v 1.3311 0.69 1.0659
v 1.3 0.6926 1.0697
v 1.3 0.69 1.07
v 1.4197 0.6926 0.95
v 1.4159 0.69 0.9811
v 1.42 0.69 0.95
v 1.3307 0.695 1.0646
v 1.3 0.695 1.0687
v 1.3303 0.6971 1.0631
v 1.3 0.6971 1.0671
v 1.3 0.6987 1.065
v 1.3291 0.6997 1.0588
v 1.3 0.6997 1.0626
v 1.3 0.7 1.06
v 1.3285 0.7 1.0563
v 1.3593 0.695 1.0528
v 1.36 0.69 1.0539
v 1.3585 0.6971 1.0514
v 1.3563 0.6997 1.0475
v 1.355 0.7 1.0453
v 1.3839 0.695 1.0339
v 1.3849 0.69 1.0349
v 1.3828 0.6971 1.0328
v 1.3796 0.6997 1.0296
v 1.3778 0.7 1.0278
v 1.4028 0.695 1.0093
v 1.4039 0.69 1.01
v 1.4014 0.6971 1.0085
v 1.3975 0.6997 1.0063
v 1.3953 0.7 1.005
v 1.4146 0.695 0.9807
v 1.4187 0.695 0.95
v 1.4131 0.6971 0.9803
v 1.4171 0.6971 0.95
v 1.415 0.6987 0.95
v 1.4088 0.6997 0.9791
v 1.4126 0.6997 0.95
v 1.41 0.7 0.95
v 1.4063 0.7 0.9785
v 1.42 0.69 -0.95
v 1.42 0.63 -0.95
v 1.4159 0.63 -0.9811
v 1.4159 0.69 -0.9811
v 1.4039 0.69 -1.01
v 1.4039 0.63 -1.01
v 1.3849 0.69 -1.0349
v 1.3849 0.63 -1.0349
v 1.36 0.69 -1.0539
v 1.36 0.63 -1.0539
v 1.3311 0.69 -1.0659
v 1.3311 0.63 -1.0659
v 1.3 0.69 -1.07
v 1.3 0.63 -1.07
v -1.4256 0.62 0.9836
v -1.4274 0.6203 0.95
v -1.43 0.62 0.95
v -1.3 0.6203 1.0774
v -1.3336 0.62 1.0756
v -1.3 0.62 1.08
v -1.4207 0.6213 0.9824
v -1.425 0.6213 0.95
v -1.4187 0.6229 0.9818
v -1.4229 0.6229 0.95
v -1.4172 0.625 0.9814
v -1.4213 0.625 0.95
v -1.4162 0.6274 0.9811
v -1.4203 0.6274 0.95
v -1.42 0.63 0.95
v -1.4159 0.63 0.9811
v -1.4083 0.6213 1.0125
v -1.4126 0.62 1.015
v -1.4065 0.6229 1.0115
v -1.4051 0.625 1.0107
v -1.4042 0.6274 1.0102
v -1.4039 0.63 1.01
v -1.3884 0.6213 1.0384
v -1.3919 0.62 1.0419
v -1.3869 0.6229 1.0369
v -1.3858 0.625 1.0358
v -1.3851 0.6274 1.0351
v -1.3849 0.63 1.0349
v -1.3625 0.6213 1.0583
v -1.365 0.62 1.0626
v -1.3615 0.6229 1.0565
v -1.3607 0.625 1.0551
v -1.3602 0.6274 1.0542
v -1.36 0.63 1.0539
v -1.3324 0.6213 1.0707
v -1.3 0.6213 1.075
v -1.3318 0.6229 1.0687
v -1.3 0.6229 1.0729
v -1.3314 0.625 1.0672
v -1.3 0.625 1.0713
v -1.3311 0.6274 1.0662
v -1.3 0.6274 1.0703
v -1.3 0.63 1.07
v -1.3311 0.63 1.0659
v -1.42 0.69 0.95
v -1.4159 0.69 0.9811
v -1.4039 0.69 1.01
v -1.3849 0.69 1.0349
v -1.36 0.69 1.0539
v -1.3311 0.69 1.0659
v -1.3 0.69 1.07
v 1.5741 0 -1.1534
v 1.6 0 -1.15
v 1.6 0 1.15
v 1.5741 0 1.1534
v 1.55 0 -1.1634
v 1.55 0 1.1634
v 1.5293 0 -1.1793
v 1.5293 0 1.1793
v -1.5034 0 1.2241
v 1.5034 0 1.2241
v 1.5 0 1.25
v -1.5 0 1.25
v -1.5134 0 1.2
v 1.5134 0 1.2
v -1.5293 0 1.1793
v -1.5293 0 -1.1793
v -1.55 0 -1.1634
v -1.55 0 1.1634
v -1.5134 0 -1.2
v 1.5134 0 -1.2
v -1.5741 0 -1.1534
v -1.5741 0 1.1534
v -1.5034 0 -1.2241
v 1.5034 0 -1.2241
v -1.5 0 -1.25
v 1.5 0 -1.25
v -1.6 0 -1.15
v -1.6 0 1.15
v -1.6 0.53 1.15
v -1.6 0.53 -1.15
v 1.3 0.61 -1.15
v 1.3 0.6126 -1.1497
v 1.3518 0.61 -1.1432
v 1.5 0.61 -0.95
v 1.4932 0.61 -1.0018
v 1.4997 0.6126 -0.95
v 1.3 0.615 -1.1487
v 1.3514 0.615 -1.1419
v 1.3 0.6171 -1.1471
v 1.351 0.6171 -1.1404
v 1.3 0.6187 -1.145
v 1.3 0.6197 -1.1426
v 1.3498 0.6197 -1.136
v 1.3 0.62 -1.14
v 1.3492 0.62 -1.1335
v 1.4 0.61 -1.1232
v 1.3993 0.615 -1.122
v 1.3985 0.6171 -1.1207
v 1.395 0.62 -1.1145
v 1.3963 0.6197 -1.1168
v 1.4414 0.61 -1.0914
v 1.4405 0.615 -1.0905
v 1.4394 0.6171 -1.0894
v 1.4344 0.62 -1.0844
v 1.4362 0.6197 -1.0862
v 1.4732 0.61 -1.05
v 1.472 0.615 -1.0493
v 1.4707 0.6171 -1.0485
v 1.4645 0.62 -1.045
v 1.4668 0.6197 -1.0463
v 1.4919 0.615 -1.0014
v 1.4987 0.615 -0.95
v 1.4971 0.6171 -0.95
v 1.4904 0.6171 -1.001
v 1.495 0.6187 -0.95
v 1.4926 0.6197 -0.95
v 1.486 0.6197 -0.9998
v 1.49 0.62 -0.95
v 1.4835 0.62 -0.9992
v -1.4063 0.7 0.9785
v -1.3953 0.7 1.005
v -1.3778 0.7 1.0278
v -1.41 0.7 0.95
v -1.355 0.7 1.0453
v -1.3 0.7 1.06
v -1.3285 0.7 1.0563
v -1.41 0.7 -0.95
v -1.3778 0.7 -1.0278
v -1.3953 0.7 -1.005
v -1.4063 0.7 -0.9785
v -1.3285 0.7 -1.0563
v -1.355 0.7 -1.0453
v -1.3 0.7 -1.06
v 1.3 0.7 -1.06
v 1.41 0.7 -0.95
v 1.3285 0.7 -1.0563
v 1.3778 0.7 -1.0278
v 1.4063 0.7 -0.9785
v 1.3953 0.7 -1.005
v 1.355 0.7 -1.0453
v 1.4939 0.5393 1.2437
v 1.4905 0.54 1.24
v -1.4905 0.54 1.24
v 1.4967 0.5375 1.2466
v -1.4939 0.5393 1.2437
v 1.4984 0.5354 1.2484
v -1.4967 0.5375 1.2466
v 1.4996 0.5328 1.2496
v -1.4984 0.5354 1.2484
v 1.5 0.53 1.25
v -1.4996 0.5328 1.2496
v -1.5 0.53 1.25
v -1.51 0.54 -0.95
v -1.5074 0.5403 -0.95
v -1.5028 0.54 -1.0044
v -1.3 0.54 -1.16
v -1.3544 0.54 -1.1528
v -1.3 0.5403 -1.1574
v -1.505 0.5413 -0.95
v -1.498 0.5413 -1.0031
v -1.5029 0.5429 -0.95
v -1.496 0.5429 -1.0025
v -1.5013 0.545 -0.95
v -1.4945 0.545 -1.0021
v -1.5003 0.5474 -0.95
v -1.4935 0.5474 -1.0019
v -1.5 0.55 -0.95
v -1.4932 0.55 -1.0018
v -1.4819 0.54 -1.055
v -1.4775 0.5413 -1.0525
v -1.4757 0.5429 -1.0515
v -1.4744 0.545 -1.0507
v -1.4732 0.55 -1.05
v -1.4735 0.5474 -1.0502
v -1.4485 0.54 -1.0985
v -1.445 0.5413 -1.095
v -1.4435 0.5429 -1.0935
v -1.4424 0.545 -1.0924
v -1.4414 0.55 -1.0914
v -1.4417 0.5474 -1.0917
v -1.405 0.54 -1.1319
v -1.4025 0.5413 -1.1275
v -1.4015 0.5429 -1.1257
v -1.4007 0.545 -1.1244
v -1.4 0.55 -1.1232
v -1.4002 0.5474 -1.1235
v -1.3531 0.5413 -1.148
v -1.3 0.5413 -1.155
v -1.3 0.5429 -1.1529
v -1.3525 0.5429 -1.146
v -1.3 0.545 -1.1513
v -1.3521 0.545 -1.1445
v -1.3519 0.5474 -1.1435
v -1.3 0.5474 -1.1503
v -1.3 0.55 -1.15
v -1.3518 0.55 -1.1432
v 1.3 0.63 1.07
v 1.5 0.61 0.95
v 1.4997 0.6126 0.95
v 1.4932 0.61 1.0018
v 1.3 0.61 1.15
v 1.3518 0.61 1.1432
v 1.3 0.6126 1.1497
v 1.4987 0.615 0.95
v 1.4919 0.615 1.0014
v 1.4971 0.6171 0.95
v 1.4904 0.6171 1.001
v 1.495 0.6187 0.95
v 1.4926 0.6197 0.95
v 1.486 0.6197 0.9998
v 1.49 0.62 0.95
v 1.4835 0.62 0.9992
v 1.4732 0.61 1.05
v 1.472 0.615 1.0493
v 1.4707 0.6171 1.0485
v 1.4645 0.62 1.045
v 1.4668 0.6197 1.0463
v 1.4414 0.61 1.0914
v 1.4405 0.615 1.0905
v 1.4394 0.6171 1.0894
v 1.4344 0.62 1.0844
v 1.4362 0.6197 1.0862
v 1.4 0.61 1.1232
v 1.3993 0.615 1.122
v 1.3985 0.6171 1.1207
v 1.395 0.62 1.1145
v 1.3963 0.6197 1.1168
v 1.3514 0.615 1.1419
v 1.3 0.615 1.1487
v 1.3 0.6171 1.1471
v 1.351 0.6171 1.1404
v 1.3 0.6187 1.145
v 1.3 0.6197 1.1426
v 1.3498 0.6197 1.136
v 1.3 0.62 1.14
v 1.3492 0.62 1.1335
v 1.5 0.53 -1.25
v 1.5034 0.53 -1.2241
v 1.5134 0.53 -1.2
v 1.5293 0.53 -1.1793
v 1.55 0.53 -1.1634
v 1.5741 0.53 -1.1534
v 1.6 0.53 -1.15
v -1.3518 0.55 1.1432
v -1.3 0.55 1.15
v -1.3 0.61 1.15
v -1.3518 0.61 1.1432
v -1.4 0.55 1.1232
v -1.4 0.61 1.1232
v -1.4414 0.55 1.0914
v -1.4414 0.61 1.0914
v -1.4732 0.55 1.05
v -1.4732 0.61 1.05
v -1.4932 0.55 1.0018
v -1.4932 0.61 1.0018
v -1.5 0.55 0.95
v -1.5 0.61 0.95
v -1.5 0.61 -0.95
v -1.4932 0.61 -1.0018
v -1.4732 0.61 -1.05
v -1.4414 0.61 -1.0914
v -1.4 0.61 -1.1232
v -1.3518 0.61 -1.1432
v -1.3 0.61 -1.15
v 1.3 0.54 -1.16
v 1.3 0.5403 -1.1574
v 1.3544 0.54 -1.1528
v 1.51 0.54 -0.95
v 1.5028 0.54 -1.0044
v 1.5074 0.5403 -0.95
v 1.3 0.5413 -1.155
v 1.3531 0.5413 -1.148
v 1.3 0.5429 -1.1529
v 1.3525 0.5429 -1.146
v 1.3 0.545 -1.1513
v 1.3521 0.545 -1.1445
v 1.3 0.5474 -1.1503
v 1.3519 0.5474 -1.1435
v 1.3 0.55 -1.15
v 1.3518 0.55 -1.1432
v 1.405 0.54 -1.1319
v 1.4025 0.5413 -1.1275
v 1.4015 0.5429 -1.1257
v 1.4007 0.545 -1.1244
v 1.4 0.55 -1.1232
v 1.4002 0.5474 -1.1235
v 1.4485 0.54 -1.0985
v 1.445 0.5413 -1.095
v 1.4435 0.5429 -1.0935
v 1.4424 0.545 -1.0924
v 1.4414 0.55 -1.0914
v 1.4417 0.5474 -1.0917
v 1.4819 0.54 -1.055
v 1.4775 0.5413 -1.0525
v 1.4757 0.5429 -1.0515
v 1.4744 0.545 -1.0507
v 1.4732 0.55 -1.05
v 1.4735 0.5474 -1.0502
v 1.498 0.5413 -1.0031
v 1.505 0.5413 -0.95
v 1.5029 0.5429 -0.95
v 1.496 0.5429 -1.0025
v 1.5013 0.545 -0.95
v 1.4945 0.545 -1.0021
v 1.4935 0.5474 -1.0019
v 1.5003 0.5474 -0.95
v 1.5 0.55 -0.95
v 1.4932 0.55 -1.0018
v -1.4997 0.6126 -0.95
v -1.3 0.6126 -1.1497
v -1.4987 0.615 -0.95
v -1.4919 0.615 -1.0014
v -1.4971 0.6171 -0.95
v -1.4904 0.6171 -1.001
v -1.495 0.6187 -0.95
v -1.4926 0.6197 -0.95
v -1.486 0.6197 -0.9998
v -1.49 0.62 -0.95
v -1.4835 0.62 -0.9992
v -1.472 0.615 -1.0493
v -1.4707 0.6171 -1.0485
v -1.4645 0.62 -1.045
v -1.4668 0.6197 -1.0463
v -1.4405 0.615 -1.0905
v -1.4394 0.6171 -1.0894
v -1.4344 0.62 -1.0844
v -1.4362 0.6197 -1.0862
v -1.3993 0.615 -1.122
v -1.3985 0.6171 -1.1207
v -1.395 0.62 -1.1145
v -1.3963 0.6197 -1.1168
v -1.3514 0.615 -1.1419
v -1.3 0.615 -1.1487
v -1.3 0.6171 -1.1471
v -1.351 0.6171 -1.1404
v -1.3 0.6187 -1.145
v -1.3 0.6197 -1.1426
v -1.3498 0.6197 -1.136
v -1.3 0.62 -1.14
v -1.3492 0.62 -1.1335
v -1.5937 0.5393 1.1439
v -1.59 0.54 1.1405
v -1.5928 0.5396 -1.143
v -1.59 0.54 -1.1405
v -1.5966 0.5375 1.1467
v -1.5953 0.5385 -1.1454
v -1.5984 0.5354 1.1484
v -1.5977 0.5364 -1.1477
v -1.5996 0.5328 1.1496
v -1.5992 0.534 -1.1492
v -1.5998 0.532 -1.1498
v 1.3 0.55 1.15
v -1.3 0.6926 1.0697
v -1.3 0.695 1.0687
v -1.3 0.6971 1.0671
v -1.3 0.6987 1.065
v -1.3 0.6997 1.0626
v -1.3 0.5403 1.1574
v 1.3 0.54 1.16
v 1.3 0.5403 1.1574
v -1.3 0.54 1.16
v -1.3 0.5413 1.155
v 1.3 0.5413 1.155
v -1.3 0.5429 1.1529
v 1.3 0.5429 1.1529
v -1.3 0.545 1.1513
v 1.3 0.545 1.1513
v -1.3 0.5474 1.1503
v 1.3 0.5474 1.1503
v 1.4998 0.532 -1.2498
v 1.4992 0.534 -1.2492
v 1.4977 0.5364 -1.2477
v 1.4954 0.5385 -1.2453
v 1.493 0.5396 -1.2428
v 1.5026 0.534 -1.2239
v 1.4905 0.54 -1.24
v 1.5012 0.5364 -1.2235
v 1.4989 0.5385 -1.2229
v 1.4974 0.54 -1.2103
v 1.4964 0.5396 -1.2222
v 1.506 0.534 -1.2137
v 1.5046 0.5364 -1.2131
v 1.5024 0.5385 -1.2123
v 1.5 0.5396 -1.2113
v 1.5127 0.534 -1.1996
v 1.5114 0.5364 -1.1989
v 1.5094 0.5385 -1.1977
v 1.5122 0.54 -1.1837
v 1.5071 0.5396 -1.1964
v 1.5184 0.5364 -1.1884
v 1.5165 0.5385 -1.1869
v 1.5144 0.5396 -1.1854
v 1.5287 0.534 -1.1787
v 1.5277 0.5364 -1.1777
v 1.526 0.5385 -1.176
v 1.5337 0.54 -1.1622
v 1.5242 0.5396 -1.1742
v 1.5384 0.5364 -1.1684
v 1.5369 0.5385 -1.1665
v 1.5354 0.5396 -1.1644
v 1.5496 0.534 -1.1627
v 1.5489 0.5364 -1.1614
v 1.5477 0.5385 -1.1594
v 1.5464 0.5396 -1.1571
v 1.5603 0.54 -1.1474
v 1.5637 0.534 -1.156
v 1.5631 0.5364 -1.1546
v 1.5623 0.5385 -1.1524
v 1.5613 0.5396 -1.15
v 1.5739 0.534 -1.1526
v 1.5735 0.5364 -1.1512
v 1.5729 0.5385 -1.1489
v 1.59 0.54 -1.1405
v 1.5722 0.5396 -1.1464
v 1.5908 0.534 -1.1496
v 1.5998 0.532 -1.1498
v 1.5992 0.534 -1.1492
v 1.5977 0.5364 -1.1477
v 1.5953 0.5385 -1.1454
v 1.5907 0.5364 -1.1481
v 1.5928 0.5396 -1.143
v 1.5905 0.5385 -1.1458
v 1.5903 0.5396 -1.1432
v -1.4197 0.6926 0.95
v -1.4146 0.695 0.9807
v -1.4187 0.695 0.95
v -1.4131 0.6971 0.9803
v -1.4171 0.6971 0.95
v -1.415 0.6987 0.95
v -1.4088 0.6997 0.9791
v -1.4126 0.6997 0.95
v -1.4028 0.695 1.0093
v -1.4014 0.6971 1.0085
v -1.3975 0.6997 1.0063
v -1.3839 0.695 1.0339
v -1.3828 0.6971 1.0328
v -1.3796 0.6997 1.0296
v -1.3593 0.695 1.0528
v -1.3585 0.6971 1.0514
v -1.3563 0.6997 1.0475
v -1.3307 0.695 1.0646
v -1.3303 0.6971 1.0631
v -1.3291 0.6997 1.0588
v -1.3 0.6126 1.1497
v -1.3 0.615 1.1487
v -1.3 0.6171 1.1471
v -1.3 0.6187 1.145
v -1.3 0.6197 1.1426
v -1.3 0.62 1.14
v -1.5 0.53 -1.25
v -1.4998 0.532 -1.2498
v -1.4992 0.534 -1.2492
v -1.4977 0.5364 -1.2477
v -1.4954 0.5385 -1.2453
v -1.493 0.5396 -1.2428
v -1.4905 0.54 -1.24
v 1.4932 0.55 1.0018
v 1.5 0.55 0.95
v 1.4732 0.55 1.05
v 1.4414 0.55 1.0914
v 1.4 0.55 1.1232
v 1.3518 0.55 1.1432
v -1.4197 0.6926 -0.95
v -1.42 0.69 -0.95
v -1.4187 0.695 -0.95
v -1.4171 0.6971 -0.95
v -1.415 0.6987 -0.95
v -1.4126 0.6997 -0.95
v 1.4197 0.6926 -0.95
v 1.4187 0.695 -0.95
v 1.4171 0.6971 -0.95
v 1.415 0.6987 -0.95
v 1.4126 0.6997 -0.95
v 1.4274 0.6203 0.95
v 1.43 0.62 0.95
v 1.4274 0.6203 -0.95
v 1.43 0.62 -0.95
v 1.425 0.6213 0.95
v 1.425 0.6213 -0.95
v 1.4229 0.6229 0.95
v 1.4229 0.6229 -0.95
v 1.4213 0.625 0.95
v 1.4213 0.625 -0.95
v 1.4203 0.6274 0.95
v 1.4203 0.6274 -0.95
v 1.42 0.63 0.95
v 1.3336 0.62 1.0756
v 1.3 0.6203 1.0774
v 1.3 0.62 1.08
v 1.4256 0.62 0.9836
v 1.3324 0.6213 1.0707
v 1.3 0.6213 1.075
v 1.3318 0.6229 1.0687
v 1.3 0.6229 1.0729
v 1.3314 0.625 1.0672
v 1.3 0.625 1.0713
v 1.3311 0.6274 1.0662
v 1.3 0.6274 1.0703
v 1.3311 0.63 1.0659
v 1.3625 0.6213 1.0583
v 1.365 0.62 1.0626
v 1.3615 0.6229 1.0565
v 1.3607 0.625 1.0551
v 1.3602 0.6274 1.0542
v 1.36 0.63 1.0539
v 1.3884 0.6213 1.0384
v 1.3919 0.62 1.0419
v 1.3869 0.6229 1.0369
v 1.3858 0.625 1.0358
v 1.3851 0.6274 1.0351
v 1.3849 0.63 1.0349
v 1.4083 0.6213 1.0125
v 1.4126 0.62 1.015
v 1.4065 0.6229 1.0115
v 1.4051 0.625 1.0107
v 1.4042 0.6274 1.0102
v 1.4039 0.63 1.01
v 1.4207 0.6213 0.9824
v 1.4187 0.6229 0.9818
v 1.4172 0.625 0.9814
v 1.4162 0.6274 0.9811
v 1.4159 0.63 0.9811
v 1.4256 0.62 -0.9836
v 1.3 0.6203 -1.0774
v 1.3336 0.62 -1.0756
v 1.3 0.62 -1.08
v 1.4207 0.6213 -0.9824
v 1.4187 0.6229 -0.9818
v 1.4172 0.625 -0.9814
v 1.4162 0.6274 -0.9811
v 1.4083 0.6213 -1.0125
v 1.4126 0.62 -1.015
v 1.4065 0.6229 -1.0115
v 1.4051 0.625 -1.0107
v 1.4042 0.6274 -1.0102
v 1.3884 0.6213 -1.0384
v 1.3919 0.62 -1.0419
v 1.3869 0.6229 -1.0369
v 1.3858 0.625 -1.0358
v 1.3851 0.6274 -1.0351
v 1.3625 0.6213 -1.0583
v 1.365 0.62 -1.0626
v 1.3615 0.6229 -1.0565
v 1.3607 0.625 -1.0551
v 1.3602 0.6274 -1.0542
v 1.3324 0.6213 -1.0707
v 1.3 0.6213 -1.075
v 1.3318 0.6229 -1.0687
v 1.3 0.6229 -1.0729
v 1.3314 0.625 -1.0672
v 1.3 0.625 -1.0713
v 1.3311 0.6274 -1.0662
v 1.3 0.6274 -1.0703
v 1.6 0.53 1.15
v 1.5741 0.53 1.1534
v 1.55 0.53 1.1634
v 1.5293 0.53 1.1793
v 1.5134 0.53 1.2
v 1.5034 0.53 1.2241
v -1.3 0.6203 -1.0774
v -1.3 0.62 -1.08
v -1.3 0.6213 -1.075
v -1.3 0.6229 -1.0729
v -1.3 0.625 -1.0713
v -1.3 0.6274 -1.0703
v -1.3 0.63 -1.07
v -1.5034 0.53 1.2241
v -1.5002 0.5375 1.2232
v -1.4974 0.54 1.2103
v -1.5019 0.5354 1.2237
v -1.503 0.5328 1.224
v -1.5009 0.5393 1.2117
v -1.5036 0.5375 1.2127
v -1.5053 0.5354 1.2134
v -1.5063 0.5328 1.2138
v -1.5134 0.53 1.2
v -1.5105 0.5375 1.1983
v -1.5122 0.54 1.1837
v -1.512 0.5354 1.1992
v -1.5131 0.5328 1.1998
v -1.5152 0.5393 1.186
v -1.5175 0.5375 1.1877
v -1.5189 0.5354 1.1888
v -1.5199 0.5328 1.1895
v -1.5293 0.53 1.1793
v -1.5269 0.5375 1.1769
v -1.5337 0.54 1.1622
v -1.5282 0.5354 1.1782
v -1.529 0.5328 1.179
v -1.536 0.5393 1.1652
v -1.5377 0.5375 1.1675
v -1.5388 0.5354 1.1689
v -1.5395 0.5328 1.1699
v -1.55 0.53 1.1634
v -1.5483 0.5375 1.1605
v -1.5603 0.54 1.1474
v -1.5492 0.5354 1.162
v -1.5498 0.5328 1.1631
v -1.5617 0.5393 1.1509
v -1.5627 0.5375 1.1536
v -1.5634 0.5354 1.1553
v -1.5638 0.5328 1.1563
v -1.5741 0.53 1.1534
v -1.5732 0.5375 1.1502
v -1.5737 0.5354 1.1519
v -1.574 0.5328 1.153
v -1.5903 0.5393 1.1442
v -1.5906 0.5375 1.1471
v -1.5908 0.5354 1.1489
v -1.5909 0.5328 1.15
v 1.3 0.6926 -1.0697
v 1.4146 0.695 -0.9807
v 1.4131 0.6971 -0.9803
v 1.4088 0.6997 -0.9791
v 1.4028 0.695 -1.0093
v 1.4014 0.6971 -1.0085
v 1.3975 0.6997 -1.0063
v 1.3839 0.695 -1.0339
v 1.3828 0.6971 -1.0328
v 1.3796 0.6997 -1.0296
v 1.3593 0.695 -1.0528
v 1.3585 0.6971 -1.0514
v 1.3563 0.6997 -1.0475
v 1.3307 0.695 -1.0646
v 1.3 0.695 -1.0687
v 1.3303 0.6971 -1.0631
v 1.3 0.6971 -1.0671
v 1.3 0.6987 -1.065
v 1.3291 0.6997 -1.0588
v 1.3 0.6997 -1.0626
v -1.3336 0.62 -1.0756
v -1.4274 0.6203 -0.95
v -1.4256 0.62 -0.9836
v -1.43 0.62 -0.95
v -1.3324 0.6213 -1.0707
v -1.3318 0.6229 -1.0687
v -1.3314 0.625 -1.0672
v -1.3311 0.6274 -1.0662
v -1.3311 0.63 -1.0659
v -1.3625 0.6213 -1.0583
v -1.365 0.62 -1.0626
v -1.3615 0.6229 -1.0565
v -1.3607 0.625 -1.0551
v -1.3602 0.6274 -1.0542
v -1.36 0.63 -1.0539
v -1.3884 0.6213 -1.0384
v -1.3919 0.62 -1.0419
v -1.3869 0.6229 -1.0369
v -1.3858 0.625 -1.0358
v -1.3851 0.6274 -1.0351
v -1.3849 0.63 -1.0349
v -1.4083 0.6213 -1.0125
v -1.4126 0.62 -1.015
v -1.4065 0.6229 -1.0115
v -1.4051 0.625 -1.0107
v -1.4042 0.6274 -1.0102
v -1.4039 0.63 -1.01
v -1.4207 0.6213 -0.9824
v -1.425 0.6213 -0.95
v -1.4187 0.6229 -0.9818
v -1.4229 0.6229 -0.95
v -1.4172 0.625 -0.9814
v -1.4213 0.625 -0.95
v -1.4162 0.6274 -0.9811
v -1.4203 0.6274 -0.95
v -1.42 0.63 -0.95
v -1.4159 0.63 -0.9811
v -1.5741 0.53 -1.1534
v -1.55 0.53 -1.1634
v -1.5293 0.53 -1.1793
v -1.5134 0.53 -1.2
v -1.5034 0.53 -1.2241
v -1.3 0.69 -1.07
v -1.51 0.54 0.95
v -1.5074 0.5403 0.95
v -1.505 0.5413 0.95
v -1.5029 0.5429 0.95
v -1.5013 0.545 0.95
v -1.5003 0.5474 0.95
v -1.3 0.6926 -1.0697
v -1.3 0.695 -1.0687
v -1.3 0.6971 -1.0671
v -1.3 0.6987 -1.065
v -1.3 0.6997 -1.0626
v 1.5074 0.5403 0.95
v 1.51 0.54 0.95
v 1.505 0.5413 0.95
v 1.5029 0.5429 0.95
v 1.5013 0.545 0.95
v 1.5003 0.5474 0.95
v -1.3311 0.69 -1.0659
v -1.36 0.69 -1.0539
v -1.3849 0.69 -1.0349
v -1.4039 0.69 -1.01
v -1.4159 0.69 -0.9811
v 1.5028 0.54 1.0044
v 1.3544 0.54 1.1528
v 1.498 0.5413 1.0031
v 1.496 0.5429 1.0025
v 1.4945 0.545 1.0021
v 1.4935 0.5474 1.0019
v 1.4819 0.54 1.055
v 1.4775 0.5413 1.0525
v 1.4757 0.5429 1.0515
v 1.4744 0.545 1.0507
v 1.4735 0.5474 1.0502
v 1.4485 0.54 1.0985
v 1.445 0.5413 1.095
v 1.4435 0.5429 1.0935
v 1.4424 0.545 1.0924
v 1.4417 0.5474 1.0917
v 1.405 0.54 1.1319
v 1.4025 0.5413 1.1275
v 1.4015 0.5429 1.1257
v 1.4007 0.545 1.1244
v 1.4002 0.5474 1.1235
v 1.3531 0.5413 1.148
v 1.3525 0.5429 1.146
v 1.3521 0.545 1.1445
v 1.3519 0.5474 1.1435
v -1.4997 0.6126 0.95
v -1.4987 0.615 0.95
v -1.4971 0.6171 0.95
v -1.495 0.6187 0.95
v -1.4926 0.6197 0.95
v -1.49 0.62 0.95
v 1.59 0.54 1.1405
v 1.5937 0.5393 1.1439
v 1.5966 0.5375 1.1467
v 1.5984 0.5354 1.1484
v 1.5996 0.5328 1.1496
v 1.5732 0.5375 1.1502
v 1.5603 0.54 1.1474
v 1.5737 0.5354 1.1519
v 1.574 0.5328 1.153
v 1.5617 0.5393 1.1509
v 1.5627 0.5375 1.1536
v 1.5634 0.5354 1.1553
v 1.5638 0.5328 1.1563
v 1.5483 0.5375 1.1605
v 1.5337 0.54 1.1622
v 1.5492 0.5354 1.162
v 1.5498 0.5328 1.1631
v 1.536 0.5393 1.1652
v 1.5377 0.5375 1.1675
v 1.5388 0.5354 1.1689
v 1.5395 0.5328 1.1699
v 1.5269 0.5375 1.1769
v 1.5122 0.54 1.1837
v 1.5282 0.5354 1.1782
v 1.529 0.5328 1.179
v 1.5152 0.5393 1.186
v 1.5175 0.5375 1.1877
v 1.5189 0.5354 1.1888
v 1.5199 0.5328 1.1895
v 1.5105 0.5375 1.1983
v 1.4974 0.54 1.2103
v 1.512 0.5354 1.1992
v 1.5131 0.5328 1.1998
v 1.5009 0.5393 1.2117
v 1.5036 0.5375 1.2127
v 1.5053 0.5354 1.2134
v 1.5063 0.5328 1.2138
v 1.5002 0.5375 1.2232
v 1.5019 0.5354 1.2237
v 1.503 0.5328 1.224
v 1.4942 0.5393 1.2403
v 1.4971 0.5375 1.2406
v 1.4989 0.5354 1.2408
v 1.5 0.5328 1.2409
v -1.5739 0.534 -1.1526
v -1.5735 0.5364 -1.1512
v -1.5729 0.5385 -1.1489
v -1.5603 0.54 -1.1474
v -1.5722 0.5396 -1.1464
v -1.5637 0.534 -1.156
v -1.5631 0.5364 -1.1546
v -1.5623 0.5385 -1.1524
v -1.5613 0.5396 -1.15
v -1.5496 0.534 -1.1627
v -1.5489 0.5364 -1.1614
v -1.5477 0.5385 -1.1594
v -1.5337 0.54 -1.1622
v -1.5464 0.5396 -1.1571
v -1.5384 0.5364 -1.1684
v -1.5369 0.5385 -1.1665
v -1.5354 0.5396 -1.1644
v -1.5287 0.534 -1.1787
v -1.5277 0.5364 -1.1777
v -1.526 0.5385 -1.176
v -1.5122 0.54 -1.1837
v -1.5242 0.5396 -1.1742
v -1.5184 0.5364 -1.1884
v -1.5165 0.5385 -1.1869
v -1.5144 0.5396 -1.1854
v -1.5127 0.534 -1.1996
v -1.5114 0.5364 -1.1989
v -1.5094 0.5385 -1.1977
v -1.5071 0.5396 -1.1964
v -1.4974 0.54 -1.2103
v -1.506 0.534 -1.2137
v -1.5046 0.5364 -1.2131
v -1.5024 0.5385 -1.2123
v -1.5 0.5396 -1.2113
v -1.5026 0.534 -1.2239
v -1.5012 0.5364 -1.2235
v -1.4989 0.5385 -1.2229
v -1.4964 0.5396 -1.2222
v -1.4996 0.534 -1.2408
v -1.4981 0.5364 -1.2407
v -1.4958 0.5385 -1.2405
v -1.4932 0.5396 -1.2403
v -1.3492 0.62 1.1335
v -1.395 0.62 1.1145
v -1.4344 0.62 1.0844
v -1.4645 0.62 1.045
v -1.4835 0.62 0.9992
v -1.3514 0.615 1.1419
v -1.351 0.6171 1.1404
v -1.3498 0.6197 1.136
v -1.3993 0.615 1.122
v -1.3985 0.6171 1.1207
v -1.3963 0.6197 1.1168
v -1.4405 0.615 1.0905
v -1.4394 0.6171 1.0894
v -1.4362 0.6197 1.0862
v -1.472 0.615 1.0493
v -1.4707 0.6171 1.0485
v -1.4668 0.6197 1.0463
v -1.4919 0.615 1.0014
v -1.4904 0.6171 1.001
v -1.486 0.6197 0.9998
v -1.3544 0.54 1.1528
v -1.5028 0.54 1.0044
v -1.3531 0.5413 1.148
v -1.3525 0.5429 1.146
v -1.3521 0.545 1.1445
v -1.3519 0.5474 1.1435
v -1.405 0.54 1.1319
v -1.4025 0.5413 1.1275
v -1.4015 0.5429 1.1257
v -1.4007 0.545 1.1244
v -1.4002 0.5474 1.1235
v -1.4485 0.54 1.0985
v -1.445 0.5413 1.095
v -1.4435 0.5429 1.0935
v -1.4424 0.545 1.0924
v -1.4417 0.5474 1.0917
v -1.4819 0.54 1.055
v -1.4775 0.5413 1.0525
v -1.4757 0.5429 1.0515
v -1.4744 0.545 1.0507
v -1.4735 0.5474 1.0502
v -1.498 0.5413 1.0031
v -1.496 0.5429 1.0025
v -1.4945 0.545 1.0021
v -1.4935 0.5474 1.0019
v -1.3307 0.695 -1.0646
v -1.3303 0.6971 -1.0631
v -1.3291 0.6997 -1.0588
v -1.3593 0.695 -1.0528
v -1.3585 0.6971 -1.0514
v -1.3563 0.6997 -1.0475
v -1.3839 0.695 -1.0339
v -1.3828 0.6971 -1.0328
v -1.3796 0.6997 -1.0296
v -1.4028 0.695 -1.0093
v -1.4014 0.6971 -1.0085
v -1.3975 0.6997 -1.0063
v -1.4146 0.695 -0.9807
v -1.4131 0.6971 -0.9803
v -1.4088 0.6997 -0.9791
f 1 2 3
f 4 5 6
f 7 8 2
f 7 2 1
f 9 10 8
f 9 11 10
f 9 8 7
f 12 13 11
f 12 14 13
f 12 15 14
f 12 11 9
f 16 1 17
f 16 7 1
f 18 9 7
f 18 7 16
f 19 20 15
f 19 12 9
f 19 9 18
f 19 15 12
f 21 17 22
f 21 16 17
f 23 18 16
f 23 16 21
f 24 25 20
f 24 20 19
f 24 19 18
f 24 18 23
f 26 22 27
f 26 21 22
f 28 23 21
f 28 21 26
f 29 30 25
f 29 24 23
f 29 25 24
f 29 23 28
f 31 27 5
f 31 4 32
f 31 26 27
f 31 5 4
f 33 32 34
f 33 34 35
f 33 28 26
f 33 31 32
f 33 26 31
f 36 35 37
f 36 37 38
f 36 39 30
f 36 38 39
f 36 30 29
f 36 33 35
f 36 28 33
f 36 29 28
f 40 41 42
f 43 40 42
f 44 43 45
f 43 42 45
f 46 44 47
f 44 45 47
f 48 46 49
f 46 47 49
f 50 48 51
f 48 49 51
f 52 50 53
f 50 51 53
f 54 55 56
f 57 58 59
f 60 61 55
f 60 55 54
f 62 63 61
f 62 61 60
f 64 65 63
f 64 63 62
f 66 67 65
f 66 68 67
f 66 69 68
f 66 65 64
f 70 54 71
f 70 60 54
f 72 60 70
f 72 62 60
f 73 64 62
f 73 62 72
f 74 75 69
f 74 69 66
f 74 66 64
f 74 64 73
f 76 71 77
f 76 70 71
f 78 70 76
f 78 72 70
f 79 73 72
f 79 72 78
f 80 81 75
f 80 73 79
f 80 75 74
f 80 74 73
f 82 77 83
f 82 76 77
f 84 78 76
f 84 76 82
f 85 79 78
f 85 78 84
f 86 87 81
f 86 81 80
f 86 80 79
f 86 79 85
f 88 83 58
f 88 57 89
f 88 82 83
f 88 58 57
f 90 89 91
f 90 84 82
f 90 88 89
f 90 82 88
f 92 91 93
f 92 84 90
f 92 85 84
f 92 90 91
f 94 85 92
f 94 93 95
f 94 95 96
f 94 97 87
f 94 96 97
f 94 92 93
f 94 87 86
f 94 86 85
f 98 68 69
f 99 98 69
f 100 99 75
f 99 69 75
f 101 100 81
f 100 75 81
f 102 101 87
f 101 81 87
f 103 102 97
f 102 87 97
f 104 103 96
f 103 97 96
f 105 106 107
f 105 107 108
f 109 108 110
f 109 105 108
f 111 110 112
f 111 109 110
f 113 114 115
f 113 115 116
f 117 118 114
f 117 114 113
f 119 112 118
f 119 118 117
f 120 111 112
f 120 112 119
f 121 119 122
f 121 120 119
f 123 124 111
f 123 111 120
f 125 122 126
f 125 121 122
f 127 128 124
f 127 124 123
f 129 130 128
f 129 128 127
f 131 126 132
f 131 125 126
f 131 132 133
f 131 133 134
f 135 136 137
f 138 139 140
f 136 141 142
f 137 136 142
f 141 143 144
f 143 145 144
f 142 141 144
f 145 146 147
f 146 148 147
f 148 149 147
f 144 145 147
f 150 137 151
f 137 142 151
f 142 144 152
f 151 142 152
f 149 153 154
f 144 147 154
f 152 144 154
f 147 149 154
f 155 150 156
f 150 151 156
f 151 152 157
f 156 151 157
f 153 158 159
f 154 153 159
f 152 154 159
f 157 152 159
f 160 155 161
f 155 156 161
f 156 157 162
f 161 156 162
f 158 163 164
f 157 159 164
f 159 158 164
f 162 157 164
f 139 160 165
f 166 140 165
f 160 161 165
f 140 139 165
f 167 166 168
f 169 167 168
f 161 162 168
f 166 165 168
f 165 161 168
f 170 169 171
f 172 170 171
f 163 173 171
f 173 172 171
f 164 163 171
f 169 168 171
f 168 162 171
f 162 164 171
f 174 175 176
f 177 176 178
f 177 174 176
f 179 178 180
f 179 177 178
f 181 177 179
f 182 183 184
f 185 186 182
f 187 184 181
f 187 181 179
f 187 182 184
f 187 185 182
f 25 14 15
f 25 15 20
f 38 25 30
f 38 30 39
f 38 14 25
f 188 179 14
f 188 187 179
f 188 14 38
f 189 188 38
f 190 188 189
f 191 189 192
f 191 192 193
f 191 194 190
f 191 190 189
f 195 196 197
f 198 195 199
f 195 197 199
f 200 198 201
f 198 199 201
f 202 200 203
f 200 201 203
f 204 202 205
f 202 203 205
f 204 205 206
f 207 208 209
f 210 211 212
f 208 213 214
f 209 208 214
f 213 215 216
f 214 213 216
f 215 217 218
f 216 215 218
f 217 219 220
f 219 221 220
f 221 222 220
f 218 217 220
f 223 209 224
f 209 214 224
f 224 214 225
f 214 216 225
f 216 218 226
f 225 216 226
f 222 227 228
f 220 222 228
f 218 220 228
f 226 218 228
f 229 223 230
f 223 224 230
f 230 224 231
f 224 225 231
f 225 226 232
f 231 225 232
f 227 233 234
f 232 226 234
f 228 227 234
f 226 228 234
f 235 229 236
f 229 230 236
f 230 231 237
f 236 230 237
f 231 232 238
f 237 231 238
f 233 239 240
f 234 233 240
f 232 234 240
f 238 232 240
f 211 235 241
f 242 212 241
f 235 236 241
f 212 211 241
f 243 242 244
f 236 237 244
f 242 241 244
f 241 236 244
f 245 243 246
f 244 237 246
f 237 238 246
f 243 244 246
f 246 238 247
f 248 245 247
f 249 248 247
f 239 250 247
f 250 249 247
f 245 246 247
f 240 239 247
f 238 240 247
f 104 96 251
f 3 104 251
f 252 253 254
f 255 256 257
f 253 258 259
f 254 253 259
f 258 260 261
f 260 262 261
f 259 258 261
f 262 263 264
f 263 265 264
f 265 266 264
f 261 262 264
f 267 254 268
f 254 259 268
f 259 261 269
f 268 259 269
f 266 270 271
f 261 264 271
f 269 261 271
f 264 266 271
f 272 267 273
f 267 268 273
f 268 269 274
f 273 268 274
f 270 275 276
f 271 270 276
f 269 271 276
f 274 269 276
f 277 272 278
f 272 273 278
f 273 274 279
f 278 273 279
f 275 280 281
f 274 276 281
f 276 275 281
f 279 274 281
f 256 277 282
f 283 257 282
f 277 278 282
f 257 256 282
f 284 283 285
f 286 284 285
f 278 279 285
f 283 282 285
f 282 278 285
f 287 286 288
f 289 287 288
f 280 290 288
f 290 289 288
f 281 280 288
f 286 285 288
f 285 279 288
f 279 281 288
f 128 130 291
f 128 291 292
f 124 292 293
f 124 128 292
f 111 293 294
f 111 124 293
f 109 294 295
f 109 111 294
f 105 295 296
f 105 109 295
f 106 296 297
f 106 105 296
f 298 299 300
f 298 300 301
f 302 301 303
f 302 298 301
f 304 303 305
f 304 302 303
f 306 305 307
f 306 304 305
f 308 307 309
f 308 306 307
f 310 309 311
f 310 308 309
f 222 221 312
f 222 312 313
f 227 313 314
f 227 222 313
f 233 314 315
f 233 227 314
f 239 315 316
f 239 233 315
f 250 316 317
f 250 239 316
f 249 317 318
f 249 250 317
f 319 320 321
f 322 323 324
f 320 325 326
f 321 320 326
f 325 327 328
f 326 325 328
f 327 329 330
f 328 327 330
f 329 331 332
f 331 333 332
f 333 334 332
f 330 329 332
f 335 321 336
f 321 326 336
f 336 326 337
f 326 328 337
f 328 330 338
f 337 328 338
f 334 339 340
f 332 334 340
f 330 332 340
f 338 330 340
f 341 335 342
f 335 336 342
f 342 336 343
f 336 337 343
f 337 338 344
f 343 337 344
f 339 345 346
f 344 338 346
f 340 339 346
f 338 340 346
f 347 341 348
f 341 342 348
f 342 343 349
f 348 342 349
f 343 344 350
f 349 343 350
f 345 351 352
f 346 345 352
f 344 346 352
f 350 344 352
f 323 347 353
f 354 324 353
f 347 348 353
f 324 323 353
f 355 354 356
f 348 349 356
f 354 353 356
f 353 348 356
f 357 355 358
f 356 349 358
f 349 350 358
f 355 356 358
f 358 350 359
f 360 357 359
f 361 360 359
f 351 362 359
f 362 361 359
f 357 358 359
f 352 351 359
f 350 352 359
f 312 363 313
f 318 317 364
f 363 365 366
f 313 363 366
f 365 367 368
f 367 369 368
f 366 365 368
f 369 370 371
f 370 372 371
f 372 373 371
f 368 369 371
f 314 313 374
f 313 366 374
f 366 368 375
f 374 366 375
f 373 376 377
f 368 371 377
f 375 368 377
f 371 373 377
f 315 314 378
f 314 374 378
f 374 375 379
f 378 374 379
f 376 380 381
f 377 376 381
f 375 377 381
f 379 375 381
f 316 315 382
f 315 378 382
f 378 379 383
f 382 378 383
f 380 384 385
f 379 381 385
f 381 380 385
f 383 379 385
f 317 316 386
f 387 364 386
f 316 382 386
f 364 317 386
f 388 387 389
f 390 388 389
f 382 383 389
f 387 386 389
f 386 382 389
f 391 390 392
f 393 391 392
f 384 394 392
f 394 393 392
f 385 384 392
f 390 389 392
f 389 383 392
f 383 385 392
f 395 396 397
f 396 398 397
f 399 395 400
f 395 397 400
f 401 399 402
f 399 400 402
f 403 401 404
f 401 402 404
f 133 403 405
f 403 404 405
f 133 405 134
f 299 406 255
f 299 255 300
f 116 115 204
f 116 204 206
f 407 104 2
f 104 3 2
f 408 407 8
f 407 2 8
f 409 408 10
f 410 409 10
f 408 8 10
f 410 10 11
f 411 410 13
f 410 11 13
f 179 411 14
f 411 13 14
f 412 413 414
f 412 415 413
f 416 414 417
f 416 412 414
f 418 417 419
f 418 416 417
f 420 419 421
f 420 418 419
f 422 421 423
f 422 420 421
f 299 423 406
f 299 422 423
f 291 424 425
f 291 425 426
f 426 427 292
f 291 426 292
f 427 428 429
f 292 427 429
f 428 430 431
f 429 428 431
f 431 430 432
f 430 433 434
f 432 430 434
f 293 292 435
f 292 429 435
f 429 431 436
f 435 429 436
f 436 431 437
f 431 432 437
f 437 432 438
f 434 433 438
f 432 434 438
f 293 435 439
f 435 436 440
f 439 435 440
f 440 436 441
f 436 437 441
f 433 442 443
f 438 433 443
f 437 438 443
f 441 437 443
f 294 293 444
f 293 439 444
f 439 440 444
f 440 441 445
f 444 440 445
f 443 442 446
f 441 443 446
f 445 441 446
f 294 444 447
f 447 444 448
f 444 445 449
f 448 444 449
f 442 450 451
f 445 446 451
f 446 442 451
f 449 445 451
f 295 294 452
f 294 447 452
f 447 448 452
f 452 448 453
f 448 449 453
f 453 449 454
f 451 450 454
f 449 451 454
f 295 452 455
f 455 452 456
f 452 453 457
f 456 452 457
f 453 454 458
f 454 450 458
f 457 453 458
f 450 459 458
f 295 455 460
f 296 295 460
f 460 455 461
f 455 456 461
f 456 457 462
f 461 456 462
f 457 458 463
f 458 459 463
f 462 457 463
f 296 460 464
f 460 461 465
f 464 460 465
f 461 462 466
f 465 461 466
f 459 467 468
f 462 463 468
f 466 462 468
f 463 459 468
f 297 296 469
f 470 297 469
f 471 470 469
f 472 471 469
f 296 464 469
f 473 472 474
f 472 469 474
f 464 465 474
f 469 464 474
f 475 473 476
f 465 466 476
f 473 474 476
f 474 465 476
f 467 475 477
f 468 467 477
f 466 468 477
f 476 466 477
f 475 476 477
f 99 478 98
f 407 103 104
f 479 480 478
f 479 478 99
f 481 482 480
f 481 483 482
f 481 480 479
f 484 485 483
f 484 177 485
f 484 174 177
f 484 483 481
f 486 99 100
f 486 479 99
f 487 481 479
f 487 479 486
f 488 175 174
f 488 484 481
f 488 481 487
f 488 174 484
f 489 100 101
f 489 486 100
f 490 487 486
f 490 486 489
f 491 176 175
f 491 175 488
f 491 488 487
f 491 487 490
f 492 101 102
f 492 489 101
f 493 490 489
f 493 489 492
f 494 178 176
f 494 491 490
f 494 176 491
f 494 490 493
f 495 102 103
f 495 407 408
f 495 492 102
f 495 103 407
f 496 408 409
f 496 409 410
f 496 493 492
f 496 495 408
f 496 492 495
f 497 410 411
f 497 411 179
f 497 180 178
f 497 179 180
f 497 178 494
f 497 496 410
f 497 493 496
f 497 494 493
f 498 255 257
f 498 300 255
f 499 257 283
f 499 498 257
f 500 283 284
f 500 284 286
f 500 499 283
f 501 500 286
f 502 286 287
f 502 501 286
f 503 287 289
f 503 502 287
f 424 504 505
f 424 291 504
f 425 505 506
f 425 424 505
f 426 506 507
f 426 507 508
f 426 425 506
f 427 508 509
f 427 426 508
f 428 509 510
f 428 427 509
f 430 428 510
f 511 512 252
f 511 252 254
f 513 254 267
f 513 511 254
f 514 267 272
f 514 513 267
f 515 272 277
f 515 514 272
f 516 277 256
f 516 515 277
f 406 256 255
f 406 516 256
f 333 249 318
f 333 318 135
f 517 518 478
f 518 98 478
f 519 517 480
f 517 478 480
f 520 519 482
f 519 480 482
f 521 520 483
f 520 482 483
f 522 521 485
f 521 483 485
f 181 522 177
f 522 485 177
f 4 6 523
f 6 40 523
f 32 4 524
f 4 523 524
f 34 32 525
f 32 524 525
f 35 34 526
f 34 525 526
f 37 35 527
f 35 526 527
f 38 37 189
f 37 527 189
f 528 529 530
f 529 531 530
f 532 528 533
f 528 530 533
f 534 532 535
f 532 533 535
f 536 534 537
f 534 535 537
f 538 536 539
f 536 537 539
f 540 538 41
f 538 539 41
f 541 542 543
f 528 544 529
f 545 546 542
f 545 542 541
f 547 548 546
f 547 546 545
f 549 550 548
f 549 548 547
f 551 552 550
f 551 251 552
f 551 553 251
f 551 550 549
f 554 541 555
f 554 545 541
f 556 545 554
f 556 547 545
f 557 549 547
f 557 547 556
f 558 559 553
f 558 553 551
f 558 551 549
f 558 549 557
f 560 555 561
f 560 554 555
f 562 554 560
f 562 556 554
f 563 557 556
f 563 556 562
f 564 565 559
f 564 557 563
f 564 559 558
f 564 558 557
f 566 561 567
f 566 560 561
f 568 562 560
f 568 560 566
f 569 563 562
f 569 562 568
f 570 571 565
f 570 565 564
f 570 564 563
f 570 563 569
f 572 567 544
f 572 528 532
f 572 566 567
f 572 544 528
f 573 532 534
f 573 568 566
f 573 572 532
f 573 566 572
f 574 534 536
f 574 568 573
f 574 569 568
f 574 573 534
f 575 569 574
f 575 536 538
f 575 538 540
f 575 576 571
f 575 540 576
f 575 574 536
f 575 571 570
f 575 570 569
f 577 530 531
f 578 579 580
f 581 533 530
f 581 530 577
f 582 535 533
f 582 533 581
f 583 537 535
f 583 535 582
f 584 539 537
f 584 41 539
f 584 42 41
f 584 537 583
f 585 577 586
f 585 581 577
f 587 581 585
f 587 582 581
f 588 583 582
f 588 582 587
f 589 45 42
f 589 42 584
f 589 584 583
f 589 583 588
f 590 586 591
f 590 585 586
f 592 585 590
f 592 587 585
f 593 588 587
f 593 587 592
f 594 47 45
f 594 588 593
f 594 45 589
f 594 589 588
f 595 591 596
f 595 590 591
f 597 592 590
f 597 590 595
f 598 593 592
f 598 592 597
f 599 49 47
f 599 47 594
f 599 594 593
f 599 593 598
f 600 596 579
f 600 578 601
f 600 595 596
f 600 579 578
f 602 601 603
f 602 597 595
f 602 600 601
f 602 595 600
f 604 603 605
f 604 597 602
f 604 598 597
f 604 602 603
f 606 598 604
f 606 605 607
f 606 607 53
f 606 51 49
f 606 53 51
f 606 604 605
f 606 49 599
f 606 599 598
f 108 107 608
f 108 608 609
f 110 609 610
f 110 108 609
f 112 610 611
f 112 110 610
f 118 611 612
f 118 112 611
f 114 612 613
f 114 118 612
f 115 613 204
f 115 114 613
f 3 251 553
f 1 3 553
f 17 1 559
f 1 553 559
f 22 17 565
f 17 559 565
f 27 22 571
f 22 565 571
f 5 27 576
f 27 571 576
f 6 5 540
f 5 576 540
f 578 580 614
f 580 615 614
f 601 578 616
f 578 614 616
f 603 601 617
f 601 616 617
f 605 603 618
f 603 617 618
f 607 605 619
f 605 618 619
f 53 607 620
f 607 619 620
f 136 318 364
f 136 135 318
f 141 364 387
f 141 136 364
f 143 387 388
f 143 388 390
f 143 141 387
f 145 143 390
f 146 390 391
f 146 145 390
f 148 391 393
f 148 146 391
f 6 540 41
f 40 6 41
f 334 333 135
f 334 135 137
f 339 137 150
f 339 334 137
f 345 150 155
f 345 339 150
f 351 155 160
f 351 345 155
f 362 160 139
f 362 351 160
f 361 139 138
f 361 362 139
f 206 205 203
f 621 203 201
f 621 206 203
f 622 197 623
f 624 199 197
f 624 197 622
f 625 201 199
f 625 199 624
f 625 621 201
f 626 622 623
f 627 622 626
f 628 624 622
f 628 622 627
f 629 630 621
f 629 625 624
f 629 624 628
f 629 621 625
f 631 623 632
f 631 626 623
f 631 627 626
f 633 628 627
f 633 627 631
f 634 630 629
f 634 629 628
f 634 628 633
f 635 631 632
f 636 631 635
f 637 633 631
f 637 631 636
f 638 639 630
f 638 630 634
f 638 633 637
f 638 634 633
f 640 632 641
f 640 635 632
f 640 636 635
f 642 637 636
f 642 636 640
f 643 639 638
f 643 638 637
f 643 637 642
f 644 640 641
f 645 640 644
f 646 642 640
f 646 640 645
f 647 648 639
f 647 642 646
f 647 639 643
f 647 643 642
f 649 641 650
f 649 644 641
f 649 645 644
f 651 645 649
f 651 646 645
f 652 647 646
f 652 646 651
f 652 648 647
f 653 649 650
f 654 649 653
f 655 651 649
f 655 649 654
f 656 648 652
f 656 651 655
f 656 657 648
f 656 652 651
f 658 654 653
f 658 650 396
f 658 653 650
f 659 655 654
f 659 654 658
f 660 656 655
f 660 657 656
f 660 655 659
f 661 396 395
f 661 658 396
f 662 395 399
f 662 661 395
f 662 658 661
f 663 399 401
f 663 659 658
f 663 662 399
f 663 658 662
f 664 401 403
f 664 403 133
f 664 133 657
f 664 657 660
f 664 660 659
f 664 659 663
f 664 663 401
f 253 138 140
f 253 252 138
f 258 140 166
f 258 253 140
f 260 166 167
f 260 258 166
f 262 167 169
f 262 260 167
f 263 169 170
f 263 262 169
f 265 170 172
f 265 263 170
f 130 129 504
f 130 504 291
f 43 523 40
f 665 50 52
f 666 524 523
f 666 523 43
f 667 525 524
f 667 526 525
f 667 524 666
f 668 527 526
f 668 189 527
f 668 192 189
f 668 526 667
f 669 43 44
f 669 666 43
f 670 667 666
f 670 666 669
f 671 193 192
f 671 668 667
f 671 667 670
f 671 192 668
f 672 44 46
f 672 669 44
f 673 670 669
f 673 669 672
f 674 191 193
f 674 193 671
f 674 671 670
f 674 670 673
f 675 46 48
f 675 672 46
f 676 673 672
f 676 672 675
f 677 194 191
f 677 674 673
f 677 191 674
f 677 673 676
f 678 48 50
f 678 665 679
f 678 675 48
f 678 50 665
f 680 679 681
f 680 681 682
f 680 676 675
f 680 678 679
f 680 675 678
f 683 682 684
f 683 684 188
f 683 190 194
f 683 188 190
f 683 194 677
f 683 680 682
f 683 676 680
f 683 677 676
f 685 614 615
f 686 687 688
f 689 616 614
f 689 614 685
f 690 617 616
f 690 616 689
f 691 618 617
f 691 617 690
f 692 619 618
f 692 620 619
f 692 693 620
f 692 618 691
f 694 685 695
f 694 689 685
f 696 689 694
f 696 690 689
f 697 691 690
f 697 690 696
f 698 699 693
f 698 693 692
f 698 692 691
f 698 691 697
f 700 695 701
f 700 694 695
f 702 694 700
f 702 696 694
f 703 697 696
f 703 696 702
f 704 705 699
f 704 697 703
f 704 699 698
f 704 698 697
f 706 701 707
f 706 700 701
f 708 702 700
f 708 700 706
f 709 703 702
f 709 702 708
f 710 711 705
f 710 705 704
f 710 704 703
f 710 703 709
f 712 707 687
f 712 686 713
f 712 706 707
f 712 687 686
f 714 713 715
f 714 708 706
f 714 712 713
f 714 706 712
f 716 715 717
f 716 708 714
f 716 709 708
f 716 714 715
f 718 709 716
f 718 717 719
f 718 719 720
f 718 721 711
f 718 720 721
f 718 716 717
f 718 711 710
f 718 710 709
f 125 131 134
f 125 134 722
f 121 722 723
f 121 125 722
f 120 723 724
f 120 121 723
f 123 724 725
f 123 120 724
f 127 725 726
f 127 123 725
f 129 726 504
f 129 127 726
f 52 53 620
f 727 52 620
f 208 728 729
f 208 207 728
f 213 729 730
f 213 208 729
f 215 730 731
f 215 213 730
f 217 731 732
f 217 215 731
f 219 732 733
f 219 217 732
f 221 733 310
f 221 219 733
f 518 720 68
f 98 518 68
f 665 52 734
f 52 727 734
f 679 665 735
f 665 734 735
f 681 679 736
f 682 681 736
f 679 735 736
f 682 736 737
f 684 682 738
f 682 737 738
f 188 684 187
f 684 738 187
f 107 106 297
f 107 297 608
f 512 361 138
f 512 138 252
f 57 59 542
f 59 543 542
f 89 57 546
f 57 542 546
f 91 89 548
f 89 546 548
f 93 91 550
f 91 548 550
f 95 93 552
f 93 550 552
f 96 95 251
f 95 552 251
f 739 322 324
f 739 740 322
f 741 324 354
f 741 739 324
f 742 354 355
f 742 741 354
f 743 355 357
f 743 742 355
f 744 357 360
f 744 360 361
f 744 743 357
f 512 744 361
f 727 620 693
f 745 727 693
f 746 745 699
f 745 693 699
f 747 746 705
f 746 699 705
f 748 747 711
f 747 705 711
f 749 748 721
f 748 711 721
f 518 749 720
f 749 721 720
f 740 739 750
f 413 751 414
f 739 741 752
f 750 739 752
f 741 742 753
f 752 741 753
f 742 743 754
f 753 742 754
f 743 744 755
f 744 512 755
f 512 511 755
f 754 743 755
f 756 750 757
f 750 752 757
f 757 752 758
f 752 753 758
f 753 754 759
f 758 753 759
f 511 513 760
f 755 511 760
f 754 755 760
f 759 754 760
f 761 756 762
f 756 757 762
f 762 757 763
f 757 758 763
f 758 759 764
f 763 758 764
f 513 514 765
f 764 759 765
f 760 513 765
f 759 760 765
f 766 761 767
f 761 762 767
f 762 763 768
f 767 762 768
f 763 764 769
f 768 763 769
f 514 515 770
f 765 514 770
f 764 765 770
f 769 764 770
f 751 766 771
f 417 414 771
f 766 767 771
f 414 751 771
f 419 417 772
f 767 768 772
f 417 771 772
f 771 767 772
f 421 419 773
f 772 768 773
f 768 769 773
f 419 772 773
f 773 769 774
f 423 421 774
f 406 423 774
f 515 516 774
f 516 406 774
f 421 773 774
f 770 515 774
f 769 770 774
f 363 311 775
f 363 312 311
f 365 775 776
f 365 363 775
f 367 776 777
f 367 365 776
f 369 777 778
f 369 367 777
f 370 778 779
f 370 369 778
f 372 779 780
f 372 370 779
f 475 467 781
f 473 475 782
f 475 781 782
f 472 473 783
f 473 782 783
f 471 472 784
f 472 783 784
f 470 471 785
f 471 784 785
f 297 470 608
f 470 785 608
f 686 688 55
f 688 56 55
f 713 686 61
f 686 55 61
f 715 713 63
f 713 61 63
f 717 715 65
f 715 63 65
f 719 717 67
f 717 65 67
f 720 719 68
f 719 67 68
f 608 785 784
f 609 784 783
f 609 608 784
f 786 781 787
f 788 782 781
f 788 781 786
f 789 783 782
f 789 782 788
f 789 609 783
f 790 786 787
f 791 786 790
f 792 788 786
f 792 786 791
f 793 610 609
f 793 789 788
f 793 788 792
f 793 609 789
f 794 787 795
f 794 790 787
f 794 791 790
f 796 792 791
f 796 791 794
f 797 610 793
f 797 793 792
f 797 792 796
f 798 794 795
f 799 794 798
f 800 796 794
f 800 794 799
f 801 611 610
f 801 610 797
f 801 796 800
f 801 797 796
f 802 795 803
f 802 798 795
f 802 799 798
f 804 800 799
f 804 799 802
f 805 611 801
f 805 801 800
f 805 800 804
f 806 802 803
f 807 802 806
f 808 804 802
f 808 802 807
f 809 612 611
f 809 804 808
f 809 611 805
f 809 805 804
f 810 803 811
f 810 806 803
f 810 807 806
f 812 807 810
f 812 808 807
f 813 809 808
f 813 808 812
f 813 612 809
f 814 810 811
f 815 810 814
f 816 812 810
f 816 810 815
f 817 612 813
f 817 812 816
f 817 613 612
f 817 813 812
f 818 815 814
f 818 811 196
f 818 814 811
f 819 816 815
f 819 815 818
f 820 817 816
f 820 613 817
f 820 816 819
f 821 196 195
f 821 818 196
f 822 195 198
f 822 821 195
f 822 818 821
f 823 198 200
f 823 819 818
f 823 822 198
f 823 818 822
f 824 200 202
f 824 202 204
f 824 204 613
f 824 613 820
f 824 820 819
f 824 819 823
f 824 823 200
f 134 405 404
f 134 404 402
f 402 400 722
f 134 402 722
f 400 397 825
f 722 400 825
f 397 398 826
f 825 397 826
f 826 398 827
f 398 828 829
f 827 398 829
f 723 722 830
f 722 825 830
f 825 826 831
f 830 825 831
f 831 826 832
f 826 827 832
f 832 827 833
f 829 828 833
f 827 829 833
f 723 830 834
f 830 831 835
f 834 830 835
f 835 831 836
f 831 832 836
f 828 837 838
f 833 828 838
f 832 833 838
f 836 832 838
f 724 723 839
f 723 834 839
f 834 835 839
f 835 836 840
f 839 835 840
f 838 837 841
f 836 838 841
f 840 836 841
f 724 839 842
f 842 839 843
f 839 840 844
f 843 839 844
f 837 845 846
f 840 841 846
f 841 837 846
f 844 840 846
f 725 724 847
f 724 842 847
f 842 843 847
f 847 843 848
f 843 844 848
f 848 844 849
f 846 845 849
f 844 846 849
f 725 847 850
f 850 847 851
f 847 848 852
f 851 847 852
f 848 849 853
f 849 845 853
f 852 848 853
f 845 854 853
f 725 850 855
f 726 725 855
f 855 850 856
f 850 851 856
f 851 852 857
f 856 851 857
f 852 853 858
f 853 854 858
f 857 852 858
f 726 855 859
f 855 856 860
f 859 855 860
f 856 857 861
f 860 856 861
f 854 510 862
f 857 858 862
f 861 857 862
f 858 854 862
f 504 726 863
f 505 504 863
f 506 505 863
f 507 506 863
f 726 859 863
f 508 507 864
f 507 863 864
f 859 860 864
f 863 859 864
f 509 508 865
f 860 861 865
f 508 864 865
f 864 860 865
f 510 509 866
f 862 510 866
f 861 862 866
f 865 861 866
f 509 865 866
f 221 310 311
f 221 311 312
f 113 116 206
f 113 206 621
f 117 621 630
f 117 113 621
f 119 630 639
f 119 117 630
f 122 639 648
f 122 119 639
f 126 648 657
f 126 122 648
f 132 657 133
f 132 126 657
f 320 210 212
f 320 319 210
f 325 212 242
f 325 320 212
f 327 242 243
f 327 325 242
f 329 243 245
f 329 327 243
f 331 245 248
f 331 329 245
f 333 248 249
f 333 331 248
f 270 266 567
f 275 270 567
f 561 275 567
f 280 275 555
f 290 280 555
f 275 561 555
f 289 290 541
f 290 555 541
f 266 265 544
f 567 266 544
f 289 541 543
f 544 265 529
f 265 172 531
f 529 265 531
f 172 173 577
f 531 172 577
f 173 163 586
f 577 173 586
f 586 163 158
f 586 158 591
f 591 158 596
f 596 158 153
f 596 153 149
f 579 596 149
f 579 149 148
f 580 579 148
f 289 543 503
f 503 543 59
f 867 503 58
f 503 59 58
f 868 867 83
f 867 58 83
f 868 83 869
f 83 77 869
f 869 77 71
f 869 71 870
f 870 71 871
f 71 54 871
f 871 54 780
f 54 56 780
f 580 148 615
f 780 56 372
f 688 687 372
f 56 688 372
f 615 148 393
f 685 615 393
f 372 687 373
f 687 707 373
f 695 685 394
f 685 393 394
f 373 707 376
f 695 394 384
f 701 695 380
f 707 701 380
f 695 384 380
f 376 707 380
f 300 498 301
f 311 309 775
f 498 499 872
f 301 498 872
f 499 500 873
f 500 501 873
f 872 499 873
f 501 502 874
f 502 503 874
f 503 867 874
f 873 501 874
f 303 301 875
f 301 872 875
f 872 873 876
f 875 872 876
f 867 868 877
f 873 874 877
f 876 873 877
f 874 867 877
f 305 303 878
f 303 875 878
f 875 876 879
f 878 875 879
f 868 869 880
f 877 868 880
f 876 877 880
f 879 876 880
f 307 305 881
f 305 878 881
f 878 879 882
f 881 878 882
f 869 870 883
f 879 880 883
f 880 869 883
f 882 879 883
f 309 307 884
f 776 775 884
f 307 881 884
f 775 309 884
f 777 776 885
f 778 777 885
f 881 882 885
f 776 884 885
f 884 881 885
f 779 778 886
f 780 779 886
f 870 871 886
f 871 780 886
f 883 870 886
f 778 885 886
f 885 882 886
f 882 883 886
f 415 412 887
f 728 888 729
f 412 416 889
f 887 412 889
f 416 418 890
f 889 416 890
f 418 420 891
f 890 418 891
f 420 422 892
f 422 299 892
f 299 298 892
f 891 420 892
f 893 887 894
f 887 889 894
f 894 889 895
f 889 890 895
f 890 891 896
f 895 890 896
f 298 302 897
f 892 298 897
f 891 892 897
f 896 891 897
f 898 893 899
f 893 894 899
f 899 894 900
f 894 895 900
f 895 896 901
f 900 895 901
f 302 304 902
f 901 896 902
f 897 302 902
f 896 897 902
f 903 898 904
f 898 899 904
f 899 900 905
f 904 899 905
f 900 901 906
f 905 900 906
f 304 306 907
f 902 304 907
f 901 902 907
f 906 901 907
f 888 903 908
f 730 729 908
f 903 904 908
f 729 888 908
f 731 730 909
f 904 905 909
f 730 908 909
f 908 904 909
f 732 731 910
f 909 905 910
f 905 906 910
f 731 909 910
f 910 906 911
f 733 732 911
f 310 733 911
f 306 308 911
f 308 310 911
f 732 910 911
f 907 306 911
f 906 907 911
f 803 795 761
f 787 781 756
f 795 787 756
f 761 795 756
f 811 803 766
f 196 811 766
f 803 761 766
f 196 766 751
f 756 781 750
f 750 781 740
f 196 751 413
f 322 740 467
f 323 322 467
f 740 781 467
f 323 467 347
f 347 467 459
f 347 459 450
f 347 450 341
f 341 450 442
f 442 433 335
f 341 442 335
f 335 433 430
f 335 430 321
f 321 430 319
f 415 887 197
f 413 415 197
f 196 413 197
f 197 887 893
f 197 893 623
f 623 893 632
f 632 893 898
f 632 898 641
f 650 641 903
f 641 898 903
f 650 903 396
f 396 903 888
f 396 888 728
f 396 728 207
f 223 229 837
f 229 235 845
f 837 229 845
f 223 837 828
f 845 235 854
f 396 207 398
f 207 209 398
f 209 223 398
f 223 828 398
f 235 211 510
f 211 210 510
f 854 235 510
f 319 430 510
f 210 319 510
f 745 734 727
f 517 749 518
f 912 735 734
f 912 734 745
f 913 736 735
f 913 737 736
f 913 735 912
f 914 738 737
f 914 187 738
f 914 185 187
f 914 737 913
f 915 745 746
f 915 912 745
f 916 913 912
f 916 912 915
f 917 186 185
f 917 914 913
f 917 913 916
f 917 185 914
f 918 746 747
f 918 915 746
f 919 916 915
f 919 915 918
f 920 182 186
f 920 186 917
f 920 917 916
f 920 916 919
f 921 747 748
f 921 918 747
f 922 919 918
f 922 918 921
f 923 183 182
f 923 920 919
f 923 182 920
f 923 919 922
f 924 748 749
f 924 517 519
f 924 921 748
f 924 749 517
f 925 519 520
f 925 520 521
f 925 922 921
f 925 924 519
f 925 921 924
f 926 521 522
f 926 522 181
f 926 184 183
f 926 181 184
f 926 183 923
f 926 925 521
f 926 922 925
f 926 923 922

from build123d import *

# Parameters (mm, degrees)
BOSS_EXTRUDE1_DEPTH = 0.54
BOSS_EXTRUDE2_DEPTH = 0.08
BOSS_EXTRUDE3_DEPTH = 0.08
FILLET1_R           = 0.01


with BuildPart() as part:
    # Sketch1 → Boss-Extrude1 (new body)
    with BuildSketch(Plane(origin=(0, 0, 0), x_dir=(1, 0, 0), z_dir=(0, 1, 0))):
        with BuildLine():
            Line((-1.5, 1.25), (1.5, 1.25))
            ThreePointArc((1.5, 1.25), (1.529289322, 1.179289322), (1.6, 1.15))
            Line((1.6, 1.15), (1.6, -1.15))
            ThreePointArc((1.6, -1.15), (1.529289322, -1.179289322), (1.5, -1.25))
            Line((1.5, -1.25), (-1.5, -1.25))
            ThreePointArc((-1.5, -1.25), (-1.529289322, -1.179289322), (-1.6, -1.15))
            Line((-1.6, -1.15), (-1.6, 1.15))
            ThreePointArc((-1.6, 1.15), (-1.529289322, 1.179289322), (-1.5, 1.25))
        make_face()
    extrude(amount=BOSS_EXTRUDE1_DEPTH)

    # Sketch2 → Boss-Extrude2 (add)
    with BuildSketch(Plane(origin=(0, 0.54, 0), x_dir=(1, 0, 0), z_dir=(0, 1, 0))):
        with BuildLine():
            Line((-1.3, 1.15), (1.3, 1.15))
            ThreePointArc((1.3, 1.15), (1.441421356, 1.091421356), (1.5, 0.95))
            Line((1.5, 0.95), (1.5, -0.95))
            ThreePointArc((1.5, -0.95), (1.441421356, -1.091421356), (1.3, -1.15))
            Line((1.3, -1.15), (-1.3, -1.15))
            ThreePointArc((-1.3, -1.15), (-1.441421356, -1.091421356), (-1.5, -0.95))
            Line((-1.5, -0.95), (-1.5, 0.95))
            ThreePointArc((-1.5, 0.95), (-1.441421356, 1.091421356), (-1.3, 1.15))
        make_face()
    extrude(amount=BOSS_EXTRUDE2_DEPTH)

    # Sketch4 → Boss-Extrude3 (add)
    with BuildSketch(Plane(origin=(0, 0.62, 0), x_dir=(1, 0, 0), z_dir=(0, 1, 0))):
        with BuildLine():
            Line((1.42, -0.95), (1.42, 0.95))
            ThreePointArc((1.42, 0.95), (1.384852814, 1.034852814), (1.3, 1.07))
            Line((1.3, 1.07), (-1.3, 1.07))
            ThreePointArc((-1.3, 1.07), (-1.384852814, 1.034852814), (-1.42, 0.95))
            Line((-1.42, 0.95), (-1.42, -0.95))
            ThreePointArc((-1.42, -0.95), (-1.384852814, -1.034852814), (-1.3, -1.07))
            Line((-1.3, -1.07), (1.3, -1.07))
            ThreePointArc((1.3, -1.07), (1.384852814, -1.034852814), (1.42, -0.95))
        make_face()
    extrude(amount=BOSS_EXTRUDE3_DEPTH)

    # Fillet1
    fillet1_edges = [part.edges().sort_by_distance(p)[0] for p in [
        (1.529289322, 0.54, -1.179289322),
        (0, 0.54, -1.25),
        (-1.529289322, 0.54, -1.179289322),
        (-1.6, 0.54, 0),
        (-1.529289322, 0.54, 1.179289322),
        (0, 0.54, 1.25),
        (1.441421356, 0.54, 1.091421356),
        (1.5, 0.54, 0),
        (1.441421356, 0.54, -1.091421356),
        (0, 0.54, -1.15),
        (-1.441421356, 0.54, -1.091421356),
        (-1.5, 0.54, 0),
        (-1.441421356, 0.54, 1.091421356),
        (0, 0.54, 1.15),
        (1.441421356, 0.62, 1.091421356),
        (1.5, 0.62, 0),
        (1.441421356, 0.62, -1.091421356),
        (0, 0.62, -1.15),
        (-1.441421356, 0.62, -1.091421356),
        (-1.5, 0.62, 0),
        (-1.441421356, 0.62, 1.091421356),
        (0, 0.62, 1.15),
        (1.529289322, 0.54, 1.179289322),
        (1.384852814, 0.62, 1.034852814),
        (1.42, 0.62, 0),
        (1.384852814, 0.62, -1.034852814),
        (0, 0.62, -1.07),
        (-1.384852814, 0.62, -1.034852814),
        (-1.42, 0.62, 0),
        (-1.384852814, 0.62, 1.034852814),
        (0, 0.62, 1.07),
        (1.384852814, 0.7, 1.034852814),
        (1.42, 0.7, 0),
        (1.384852814, 0.7, -1.034852814),
        (0, 0.7, -1.07),
        (-1.384852814, 0.7, -1.034852814),
        (-1.42, 0.7, 0),
        (-1.384852814, 0.7, 1.034852814),
        (0, 0.7, 1.07),
        (1.6, 0.54, 0),
    ]]
    fillet(fillet1_edges, radius=FILLET1_R)


solid = part.part
